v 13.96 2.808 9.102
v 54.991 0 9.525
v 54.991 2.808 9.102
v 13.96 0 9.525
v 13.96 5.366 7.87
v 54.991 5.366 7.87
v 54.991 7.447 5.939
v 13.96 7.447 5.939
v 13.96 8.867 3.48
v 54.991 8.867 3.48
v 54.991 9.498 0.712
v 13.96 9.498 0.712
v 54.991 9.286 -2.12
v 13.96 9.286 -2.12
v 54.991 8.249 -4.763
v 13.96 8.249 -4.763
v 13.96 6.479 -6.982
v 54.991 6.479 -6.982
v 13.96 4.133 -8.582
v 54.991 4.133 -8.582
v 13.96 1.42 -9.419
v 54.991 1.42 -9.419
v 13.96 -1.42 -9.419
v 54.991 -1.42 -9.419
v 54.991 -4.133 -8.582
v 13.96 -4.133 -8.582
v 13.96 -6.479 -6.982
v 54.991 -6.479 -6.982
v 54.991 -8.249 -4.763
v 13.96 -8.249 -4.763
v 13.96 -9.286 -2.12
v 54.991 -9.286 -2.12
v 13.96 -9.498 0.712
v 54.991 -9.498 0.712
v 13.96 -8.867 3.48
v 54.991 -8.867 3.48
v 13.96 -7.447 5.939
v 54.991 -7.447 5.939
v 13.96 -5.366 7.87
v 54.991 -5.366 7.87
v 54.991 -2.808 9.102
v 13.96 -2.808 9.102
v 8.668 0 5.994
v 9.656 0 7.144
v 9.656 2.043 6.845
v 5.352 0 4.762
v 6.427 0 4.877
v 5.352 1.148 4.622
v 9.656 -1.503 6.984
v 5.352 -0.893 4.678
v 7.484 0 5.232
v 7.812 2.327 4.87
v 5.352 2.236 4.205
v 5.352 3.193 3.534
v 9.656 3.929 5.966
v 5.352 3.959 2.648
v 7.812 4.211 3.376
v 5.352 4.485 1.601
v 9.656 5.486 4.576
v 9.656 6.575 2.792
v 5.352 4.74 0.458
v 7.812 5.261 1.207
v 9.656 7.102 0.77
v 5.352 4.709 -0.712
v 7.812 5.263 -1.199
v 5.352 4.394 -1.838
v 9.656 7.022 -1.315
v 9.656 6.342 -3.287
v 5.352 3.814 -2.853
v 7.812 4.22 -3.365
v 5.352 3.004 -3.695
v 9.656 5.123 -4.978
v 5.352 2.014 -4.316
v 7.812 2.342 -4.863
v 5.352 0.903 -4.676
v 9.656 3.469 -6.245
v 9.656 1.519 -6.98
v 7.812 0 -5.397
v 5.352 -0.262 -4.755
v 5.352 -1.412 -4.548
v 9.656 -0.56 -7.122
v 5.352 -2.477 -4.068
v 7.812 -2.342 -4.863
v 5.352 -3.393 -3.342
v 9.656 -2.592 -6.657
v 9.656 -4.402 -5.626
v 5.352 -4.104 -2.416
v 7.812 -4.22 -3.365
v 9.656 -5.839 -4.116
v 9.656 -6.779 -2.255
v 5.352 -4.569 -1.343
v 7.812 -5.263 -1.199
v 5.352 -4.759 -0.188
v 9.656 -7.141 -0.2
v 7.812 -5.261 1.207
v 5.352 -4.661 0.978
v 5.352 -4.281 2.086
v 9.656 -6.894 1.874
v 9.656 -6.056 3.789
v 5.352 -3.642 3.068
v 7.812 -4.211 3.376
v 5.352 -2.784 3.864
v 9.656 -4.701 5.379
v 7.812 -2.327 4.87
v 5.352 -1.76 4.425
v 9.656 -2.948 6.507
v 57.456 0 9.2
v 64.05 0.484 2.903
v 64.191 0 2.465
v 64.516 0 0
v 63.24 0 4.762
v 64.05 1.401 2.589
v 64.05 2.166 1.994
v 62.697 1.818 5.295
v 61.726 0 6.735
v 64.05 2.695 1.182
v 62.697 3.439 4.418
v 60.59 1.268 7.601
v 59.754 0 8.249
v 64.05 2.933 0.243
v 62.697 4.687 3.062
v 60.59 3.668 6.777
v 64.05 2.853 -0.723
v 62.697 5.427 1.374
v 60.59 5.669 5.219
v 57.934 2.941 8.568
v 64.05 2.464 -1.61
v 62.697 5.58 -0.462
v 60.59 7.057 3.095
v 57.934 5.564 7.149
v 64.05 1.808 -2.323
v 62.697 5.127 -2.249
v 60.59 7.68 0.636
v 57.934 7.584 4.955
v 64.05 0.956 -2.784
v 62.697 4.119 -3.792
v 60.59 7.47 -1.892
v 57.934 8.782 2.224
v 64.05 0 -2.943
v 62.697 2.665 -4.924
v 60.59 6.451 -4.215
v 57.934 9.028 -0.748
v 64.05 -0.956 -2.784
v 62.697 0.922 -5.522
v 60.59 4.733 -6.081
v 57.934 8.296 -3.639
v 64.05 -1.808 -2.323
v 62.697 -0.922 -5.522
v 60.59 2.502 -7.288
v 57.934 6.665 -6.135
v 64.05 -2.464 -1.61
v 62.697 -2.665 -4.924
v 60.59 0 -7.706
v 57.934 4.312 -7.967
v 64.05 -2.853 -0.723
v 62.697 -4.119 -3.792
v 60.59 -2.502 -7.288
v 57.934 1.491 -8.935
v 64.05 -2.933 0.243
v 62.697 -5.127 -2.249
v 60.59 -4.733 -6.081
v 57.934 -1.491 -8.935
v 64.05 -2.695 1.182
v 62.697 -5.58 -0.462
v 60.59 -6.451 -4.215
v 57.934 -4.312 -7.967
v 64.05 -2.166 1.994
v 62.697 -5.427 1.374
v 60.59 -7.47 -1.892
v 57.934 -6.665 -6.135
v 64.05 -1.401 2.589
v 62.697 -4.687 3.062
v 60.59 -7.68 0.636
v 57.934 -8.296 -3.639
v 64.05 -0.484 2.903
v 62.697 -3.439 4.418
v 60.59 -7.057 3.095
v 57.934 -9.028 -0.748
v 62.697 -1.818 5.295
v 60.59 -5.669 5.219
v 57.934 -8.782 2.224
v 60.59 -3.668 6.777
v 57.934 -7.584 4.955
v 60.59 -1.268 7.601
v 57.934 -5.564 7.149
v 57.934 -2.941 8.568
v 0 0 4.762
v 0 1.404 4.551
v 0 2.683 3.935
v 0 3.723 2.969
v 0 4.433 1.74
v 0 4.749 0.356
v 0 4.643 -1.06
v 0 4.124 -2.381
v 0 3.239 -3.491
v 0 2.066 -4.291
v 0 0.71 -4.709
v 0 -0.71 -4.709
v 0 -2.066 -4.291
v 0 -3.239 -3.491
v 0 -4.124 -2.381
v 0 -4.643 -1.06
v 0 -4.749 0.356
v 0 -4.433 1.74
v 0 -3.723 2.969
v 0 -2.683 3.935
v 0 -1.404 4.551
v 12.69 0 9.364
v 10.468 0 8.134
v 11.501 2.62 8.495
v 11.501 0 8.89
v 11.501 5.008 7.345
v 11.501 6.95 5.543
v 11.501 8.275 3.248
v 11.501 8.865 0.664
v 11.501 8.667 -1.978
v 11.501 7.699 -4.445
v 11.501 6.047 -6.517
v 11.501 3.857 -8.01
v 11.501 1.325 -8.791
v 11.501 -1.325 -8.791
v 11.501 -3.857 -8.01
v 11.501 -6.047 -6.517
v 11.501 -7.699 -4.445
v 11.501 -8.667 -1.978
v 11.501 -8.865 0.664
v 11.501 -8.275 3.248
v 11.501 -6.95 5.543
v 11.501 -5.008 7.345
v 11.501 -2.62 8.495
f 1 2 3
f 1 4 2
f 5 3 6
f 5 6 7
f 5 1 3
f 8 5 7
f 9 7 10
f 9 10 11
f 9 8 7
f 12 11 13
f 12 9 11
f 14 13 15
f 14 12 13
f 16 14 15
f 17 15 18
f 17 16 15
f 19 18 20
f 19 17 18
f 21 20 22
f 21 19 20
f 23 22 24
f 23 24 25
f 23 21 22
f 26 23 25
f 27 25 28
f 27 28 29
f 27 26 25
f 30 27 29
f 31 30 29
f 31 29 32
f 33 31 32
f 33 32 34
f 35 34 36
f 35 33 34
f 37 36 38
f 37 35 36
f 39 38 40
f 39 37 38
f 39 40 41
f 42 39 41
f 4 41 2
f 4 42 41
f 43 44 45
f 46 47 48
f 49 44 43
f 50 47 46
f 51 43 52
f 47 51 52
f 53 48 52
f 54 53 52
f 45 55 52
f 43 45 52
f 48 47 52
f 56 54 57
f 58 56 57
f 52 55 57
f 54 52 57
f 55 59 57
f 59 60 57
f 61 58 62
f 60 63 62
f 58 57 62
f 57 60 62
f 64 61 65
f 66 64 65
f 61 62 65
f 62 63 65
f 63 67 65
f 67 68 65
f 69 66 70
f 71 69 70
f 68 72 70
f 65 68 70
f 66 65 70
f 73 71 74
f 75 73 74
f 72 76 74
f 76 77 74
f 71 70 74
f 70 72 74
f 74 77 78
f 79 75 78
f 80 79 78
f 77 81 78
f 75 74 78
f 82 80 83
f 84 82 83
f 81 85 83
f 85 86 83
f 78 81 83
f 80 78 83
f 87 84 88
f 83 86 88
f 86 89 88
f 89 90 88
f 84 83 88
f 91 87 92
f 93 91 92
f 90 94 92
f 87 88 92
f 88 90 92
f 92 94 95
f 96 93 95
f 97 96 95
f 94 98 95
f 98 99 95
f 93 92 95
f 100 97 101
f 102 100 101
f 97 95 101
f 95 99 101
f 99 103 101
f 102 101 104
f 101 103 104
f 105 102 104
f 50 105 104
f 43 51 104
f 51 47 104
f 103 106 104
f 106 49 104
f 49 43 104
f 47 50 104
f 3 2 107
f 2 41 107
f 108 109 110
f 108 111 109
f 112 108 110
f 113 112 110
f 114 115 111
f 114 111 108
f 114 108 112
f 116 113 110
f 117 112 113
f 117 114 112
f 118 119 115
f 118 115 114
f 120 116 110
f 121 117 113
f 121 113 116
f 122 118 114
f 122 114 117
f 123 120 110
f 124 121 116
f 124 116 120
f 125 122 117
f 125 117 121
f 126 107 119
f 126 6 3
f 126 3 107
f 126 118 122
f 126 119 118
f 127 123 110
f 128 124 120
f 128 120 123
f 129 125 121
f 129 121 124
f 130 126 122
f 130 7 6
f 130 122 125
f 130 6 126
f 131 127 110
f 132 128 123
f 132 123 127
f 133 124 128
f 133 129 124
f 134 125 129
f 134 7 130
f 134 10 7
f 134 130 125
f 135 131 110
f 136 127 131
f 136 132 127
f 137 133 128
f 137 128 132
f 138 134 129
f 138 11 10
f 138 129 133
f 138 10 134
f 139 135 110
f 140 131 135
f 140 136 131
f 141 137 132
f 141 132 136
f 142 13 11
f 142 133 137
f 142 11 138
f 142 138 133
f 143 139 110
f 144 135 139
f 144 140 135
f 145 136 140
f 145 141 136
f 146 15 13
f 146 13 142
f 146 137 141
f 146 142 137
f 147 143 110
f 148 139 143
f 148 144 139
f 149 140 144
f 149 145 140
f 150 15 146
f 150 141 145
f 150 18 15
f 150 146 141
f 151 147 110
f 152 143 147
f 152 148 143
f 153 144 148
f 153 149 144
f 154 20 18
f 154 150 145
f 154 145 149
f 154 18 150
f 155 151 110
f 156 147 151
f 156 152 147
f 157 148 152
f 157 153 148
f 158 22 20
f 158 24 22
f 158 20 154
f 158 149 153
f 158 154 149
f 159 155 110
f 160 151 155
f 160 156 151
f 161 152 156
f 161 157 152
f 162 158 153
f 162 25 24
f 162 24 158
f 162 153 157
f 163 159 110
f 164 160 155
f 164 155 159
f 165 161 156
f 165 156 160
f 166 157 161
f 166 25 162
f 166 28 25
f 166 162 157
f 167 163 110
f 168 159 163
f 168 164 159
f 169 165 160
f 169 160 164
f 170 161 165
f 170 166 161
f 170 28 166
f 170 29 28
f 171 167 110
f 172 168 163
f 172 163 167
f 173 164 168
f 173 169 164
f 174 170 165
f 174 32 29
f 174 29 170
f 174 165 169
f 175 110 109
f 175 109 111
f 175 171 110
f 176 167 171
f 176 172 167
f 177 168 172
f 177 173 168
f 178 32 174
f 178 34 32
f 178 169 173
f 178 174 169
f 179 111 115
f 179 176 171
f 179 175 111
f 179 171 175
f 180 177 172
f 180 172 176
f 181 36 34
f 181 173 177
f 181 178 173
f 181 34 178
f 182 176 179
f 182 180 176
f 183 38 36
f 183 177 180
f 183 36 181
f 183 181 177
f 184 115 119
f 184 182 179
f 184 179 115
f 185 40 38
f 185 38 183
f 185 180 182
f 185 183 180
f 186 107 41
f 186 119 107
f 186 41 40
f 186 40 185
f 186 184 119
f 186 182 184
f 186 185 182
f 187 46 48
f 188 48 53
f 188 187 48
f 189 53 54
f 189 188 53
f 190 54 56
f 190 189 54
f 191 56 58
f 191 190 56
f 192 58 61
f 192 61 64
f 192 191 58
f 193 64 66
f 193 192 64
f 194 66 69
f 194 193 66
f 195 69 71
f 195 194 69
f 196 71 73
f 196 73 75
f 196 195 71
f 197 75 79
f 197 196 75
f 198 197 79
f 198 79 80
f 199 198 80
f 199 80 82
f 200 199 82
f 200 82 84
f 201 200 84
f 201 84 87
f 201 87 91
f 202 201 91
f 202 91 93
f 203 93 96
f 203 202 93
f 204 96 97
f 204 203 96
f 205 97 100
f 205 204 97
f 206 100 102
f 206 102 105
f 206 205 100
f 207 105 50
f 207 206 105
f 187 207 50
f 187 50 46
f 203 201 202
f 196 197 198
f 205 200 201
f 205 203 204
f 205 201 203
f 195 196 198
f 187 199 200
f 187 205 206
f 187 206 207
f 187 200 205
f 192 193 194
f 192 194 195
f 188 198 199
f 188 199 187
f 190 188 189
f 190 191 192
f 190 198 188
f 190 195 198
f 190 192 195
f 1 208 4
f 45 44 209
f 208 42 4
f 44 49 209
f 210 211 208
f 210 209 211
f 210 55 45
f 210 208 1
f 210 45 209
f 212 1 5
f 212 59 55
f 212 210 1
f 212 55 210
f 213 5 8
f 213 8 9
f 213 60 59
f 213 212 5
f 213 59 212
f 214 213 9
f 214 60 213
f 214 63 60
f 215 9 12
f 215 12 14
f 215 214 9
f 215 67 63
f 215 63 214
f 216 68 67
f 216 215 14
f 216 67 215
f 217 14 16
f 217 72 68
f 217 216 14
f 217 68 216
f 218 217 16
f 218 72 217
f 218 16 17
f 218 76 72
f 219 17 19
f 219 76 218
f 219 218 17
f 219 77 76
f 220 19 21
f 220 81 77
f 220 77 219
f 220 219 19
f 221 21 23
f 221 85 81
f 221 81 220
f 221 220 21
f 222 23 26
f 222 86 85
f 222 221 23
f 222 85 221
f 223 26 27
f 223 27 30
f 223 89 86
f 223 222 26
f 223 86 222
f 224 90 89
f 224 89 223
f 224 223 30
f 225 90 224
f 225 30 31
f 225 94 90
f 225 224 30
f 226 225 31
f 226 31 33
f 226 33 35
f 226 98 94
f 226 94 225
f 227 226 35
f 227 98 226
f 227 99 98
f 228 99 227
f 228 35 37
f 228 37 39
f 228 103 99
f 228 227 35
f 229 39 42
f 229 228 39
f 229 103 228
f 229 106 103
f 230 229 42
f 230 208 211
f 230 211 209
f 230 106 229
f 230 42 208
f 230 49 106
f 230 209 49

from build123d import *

# Parameters (mm, degrees)
F2_R = 9.525
F4_R = 5.08


# Not quite as in the source:
# - a fillet or chamfer that OpenCascade refuses, or shapes differently, is made with other operations: its cross-section is extruded or revolved along the edge and cut away or added


with BuildPart() as f1:
    # F0 (on Front) → F1 (revolve)
    with BuildSketch(Plane.XZ):
        Polygon((0, 4.7625), (0, 0), (64.516, 0), (64.516, 9.525), (8.89, 9.525), (8.89, 4.7625), align=None)
    revolve(axis=Axis((32.258, 0, 0), (-1, 0, 0)))

    # F2
    f2_edges = [f1.edges().sort_by_distance(p)[0] for p in [
        (64.516, 0, -9.525),
    ]]
    fillet(f2_edges, radius=F2_R)

    # F3: fillet of radius 5.08 on 1 edges, made by hand

    # F3_s1 → F3_t2 (revolve, cut)
    with BuildSketch(Plane.XZ):
        with BuildLine():
            ThreePointArc((13.9600684167, 9.525), (10.4820301765, 8.1476544532), (8.89, 4.7625))
            Line((8.89, 4.7625), (8.89, 9.525))
            Line((8.89, 9.525), (13.9600684167, 9.525))
        make_face()
    revolve(axis=Axis((8.89, 0, 0), (-1, 0, 0)), mode=Mode.SUBTRACT)

    # F4
    f4_edges = [f1.edges().sort_by_distance(p)[0] for p in [
        (8.89, 0, -4.7625),
    ]]
    fillet(f4_edges, radius=F4_R)


solid = f1.part
